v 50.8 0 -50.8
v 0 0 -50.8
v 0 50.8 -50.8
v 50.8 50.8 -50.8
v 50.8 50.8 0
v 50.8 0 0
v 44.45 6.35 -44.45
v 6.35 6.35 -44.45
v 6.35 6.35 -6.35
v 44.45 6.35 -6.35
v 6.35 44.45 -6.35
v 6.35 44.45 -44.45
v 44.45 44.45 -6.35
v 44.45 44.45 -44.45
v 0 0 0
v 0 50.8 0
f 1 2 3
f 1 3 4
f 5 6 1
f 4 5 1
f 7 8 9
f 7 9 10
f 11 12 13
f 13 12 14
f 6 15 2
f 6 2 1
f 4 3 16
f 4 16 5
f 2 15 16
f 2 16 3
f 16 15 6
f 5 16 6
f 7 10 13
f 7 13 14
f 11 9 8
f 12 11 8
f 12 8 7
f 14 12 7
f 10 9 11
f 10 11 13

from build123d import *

# Parameters (mm, degrees)
SKETCH1_W           = 50.8
SKETCH1_H           = 50.8
SKETCH1_W_2         = 38.1
SKETCH1_H_2         = 38.1
EXTRUDE_THIN1_DEPTH = 50.8
SKETCH2_W           = 38.1
SKETCH2_H           = 38.108160065
BOSS_EXTRUDE1_DEPTH = 6.35
SKETCH3_W           = 38.1
SKETCH3_H           = 38.108160065
BOSS_EXTRUDE3_DEPTH = 6.35


with BuildPart() as part:
    # Sketch1 → Extrude-Thin1 (new body)
    with BuildSketch(Plane(origin=(0, 0, 0), x_dir=(1, 0, 0), z_dir=(0, 1, 0))):
        with Locations((25.4, 25.4)):
            Rectangle(SKETCH1_W, SKETCH1_H)
        with Locations((25.4, 25.4)):
            Rectangle(SKETCH1_W_2, SKETCH1_H_2, mode=Mode.SUBTRACT)
    extrude(amount=EXTRUDE_THIN1_DEPTH)

    # Sketch2 → Boss-Extrude1 (add)
    with BuildSketch(Plane(origin=(0, 50.8, 0), x_dir=(1, 0, 0), z_dir=(0, 1, 0))):
        with Locations((25.4, 25.404080033)):
            Rectangle(SKETCH2_W, SKETCH2_H)
    extrude(amount=-BOSS_EXTRUDE1_DEPTH)

    # Sketch3 → Boss-Extrude3 (add)
    with BuildSketch(Plane.XZ):
        with Locations((25.4, -25.395919968)):
            Rectangle(SKETCH3_W, SKETCH3_H)
    extrude(amount=-BOSS_EXTRUDE3_DEPTH)


solid = part.part
